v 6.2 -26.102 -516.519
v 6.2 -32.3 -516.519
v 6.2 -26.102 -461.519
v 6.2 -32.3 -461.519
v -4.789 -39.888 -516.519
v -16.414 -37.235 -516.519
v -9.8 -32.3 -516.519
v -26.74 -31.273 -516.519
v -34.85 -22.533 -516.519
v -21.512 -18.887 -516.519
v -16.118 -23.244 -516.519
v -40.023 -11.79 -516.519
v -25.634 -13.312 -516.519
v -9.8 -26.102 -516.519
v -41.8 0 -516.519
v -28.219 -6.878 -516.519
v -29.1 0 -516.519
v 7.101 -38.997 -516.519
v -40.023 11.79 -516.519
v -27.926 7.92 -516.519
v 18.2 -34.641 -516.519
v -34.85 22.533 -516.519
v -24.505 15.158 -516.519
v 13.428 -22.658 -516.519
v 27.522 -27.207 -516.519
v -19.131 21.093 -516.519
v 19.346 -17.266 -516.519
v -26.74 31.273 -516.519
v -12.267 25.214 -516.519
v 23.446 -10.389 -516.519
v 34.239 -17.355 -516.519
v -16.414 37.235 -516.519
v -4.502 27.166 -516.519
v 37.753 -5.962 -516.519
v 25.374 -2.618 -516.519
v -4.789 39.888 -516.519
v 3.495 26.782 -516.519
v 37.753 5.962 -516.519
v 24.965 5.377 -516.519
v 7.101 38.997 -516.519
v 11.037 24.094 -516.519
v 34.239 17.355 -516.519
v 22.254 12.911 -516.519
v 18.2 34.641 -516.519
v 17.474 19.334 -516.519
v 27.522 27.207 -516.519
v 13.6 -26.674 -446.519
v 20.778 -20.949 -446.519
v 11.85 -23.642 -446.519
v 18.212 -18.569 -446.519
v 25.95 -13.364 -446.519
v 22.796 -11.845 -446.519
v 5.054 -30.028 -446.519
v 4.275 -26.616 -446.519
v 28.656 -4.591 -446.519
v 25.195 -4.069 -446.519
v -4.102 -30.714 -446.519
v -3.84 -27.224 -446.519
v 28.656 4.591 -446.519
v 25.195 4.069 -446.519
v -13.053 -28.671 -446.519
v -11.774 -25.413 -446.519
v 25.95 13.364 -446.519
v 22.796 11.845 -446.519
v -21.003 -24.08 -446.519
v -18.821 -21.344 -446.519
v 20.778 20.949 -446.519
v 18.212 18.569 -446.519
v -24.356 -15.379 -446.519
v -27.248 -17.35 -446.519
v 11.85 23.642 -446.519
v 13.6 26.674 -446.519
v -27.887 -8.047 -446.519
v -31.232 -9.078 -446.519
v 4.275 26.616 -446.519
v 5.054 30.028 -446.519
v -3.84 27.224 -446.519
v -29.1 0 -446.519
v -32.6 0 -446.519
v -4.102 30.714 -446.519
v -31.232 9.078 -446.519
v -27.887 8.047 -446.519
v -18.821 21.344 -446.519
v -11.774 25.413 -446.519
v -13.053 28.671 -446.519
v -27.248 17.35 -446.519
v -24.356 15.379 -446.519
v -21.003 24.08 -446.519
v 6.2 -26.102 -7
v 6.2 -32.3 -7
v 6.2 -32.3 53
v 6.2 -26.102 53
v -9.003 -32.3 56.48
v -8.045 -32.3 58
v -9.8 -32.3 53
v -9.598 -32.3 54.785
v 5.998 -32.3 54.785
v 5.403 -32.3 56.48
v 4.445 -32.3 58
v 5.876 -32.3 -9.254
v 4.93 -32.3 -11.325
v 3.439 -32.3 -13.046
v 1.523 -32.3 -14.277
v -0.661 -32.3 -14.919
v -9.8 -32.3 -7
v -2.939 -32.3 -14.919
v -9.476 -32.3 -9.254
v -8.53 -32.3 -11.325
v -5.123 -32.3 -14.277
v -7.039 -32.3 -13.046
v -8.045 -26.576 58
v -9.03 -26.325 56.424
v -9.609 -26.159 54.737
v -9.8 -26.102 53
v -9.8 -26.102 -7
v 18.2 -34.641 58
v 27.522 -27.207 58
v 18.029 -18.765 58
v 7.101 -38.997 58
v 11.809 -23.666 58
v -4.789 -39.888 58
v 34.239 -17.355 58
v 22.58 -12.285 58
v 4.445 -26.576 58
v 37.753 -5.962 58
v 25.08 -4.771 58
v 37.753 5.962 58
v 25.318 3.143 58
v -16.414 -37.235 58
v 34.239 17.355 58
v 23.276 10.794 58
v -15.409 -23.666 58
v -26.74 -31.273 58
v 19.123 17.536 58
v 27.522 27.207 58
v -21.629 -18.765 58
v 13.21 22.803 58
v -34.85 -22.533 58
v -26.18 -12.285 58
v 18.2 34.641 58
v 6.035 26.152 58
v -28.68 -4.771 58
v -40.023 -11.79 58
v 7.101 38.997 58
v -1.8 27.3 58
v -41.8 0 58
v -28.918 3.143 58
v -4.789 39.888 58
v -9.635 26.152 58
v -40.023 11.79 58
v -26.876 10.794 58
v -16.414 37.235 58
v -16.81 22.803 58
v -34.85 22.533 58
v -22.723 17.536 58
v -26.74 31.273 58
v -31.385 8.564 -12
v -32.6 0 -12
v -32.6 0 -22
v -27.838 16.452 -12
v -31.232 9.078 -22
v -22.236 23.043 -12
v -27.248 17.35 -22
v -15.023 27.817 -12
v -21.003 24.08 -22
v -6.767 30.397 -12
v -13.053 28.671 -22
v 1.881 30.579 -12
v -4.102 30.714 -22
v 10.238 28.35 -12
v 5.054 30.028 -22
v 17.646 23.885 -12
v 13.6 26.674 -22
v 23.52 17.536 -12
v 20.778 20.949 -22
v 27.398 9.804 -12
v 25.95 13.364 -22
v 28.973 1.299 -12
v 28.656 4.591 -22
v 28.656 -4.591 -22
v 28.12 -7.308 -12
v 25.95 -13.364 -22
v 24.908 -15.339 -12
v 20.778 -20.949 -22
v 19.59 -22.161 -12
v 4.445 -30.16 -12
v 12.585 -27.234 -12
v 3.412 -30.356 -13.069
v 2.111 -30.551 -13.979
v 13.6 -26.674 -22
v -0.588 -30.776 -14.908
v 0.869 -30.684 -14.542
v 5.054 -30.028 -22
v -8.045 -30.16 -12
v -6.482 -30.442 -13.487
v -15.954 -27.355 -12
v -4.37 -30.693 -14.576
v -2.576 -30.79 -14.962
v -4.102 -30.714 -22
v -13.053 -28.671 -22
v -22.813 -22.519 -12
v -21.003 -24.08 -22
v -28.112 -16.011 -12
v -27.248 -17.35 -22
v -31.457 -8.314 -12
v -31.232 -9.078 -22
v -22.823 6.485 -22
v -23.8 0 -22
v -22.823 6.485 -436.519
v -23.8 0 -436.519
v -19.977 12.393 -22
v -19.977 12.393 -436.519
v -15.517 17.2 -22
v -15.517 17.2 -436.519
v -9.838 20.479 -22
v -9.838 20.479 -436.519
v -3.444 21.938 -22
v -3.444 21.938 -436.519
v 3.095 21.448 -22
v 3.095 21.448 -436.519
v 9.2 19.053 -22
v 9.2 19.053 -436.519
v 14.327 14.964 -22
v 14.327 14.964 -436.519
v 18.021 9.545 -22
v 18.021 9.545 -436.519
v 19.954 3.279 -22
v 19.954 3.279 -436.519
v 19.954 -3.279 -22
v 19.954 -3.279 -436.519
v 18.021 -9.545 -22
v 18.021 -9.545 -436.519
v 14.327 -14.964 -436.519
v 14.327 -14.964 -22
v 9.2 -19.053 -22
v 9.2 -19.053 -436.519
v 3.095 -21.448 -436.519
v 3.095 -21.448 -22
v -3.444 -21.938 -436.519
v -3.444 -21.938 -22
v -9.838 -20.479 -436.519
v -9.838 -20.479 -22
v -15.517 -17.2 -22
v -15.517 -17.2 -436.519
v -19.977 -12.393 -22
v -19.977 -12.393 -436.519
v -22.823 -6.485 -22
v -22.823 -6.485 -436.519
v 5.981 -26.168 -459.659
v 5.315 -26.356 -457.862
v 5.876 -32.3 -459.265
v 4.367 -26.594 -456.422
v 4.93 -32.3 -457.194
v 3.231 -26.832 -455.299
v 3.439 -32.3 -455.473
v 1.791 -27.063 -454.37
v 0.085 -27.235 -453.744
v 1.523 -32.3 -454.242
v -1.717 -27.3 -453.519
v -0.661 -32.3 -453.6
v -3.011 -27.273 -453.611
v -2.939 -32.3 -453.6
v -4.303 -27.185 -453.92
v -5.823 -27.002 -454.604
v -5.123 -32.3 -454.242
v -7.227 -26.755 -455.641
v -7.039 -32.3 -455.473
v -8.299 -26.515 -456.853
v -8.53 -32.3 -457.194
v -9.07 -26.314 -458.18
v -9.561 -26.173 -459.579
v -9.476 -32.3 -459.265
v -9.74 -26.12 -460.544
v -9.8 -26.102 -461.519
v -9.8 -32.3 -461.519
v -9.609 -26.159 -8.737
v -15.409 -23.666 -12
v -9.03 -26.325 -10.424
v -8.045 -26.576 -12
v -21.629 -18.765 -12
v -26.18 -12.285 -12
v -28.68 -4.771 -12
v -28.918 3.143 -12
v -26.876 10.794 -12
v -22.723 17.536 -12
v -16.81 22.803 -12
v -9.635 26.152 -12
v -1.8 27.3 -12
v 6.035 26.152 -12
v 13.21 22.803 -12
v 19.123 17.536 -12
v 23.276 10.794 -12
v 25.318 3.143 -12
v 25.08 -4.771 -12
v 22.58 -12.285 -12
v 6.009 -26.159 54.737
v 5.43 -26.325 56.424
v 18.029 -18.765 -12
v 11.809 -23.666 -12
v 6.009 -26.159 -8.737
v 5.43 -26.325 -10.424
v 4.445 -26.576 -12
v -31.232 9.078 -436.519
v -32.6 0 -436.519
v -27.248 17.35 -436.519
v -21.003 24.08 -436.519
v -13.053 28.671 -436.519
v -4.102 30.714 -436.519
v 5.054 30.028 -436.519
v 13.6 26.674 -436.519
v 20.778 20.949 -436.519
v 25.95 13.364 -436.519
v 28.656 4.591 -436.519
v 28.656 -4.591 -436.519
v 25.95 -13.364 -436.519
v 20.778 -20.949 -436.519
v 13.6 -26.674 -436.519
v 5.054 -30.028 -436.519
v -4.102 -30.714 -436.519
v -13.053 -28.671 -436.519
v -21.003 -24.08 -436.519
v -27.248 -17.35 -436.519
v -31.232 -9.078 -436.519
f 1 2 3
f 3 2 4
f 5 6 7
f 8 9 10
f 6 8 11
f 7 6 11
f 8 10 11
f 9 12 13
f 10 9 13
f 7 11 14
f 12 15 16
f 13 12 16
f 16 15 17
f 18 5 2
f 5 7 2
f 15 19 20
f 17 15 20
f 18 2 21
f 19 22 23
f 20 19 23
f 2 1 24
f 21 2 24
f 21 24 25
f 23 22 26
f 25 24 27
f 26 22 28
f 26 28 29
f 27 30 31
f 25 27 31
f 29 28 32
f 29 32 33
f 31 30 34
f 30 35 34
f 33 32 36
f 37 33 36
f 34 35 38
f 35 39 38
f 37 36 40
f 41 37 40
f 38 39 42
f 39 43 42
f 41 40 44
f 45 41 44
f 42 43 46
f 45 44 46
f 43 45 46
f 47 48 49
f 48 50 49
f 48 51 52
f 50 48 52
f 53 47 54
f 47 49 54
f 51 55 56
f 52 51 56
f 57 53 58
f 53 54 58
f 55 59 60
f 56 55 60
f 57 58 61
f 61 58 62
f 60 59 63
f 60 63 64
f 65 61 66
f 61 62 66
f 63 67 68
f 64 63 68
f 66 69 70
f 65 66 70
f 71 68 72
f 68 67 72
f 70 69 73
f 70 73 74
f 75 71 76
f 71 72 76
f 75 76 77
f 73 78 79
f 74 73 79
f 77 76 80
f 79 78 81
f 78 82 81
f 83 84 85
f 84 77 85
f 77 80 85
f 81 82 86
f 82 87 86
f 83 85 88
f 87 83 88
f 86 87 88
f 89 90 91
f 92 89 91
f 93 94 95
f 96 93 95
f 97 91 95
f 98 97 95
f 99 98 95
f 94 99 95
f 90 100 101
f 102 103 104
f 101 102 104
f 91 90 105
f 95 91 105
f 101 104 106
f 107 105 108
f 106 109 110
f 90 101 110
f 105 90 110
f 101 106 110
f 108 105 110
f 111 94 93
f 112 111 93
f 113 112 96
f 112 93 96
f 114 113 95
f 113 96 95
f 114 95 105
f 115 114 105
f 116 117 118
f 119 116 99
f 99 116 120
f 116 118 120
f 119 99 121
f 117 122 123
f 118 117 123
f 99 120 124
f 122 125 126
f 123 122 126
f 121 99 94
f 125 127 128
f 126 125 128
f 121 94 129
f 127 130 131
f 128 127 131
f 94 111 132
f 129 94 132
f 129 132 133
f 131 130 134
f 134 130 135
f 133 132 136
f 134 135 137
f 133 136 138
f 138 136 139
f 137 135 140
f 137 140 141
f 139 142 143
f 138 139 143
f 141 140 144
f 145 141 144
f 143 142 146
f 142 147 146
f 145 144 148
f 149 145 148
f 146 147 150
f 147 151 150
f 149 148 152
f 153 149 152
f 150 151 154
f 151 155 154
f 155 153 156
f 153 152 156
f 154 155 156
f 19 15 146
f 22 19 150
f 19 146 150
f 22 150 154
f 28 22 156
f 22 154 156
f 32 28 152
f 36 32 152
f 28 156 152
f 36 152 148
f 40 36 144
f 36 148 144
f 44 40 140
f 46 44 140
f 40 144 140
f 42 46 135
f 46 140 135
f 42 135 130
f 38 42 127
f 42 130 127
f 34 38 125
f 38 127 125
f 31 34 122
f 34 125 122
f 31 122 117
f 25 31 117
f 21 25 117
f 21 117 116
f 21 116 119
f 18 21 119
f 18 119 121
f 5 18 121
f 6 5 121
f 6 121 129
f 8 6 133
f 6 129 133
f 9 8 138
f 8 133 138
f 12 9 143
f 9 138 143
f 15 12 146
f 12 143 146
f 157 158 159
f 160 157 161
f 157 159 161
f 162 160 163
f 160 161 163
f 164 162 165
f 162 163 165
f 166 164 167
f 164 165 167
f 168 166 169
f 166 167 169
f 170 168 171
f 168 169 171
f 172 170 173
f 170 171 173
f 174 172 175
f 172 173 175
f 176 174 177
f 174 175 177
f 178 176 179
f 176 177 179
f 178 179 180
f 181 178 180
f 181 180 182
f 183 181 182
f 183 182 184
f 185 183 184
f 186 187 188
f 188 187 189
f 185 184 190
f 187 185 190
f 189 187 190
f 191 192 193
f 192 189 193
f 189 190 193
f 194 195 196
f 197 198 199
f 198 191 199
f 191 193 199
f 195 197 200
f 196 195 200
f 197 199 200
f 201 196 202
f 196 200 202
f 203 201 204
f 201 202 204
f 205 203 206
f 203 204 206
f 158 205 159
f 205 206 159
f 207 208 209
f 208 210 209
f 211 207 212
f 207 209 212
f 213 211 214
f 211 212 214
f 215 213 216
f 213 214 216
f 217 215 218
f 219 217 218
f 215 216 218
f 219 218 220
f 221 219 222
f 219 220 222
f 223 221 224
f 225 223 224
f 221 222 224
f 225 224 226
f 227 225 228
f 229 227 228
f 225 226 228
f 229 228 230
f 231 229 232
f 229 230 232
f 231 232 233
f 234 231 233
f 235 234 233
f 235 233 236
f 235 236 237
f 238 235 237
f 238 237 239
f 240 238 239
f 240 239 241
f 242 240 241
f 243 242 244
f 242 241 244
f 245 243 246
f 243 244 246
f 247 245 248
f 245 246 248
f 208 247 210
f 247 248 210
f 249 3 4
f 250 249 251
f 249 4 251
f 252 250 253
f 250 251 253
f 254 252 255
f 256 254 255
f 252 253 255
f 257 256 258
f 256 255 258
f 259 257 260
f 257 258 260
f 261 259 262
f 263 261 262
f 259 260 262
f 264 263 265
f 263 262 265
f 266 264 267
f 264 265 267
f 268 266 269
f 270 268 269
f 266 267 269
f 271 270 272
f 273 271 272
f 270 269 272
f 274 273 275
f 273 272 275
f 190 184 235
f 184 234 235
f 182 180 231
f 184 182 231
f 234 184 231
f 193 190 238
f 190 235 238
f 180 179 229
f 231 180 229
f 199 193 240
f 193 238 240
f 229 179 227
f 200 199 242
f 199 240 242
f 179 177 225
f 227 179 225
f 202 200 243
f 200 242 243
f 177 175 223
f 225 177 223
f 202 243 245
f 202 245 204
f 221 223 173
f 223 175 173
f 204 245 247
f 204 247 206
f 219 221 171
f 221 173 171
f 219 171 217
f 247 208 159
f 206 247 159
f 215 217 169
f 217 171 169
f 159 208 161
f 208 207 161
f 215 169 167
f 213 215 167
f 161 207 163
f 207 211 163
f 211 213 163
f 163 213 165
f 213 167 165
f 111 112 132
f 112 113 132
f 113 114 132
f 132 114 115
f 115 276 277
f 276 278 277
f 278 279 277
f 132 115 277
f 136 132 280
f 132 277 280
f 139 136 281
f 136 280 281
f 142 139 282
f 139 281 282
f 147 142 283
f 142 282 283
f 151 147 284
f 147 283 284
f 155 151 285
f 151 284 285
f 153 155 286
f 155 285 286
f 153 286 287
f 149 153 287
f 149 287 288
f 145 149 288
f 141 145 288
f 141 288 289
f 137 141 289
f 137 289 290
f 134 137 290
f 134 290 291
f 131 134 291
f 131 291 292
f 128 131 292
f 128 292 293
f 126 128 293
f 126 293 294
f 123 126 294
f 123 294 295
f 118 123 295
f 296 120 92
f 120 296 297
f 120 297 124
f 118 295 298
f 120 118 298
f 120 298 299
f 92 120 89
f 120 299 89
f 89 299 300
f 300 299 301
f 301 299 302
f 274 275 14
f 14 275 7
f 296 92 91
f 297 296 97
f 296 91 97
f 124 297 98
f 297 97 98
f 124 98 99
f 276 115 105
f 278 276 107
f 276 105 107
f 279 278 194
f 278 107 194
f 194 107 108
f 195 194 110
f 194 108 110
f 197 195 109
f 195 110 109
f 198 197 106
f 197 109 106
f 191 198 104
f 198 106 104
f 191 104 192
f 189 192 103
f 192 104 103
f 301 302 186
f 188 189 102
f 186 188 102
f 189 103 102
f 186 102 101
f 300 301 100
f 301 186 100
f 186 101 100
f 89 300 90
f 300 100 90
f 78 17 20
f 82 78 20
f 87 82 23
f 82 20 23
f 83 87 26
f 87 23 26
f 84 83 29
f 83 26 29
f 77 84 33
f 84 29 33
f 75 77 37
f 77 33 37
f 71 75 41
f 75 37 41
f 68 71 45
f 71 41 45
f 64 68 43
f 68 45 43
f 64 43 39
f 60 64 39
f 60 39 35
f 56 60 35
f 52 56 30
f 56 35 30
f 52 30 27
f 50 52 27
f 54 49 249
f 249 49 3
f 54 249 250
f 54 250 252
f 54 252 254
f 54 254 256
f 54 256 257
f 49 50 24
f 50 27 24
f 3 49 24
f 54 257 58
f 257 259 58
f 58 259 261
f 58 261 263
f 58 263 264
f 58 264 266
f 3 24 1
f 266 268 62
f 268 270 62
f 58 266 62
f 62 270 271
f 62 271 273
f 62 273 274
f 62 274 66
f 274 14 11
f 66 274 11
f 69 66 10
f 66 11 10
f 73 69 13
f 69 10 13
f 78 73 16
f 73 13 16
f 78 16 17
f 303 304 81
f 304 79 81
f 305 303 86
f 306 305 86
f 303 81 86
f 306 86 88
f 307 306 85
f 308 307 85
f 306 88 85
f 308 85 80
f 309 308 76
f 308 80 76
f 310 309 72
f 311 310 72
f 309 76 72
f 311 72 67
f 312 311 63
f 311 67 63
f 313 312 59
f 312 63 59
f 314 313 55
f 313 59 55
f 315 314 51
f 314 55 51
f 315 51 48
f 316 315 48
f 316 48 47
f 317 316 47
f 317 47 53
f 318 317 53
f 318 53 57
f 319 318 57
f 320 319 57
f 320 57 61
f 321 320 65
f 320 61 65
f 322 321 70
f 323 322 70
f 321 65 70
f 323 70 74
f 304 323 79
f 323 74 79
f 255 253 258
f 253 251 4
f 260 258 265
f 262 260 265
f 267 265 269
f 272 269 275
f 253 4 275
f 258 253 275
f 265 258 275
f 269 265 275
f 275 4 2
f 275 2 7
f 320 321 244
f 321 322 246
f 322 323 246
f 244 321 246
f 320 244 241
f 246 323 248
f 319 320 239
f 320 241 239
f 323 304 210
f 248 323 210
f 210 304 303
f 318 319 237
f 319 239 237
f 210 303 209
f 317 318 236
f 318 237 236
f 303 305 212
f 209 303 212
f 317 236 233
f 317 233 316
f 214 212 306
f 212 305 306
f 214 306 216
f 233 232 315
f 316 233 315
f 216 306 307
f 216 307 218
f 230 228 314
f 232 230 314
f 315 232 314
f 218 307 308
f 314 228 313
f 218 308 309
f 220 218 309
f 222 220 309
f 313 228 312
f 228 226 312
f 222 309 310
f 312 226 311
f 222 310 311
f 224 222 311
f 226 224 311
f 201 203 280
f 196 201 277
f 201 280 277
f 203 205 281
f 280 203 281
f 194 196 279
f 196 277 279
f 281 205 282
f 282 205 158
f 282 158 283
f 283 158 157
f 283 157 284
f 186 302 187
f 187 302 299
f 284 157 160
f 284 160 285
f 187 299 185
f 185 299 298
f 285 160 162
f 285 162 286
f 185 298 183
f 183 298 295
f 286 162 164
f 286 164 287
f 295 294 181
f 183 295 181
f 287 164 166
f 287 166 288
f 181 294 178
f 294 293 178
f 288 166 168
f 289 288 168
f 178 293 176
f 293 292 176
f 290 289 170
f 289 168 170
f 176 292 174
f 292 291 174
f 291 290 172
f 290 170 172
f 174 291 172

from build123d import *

# Parameters (mm, degrees)
CUT_EXTRUDE1_DEPTH      = 10
CUT_EXTRUDE1_DEPTH_BACK = 5


with BuildPart() as part:
    # Sketch1 → Revolve1 (revolve)
    with BuildSketch(Plane.XZ):
        Polygon((38.2, -516.518644329), (38.2, 57.999999671), (25.5, 57.999999671), (25.5, -12.000000329), (29, -12.000000329), (29, -22.000000329), (20.2, -22.000000329), (20.2, -436.518644329), (29, -436.518644329), (29, -446.518644329), (25.5, -446.518644329), (25.5, -516.518644329), align=None)
    revolve(axis=Axis((-1.8, 0, 70), (0, 0, -1)))

    # Sketch3 → Cut-Extrude1 (cut, two sides: drawn at the far end of the back side and taken through both)
    with BuildSketch(Plane(origin=(0, -27.3, 0), x_dir=(1, 0, 0), z_dir=(0, 1, 0)).offset(-CUT_EXTRUDE1_DEPTH_BACK)):
        with BuildLine():
            Line((6.2, 521.518644329), (6.2, 461.518644329))
            ThreePointArc((6.2, 461.518644329), (-1.8, 453.518644329), (-9.8, 461.518644329))
            Line((-9.8, 461.518644329), (-9.8, 521.518644329))
            ThreePointArc((-9.8, 521.518644329), (-1.8, 529.518644329), (6.2, 521.518644329))
        make_face()
        with BuildLine():
            Line((-9.8, -53.000000001), (-9.8, 6.999999999))
            ThreePointArc((-9.8, 6.999999999), (-1.8, 14.999999999), (6.2, 6.999999999))
            Line((6.2, 6.999999999), (6.2, -53.000000001))
            ThreePointArc((6.2, -53.000000001), (-1.8, -61.000000001), (-9.8, -53.000000001))
        make_face()
    extrude(amount=CUT_EXTRUDE1_DEPTH + CUT_EXTRUDE1_DEPTH_BACK, mode=Mode.SUBTRACT)


solid = part.part
